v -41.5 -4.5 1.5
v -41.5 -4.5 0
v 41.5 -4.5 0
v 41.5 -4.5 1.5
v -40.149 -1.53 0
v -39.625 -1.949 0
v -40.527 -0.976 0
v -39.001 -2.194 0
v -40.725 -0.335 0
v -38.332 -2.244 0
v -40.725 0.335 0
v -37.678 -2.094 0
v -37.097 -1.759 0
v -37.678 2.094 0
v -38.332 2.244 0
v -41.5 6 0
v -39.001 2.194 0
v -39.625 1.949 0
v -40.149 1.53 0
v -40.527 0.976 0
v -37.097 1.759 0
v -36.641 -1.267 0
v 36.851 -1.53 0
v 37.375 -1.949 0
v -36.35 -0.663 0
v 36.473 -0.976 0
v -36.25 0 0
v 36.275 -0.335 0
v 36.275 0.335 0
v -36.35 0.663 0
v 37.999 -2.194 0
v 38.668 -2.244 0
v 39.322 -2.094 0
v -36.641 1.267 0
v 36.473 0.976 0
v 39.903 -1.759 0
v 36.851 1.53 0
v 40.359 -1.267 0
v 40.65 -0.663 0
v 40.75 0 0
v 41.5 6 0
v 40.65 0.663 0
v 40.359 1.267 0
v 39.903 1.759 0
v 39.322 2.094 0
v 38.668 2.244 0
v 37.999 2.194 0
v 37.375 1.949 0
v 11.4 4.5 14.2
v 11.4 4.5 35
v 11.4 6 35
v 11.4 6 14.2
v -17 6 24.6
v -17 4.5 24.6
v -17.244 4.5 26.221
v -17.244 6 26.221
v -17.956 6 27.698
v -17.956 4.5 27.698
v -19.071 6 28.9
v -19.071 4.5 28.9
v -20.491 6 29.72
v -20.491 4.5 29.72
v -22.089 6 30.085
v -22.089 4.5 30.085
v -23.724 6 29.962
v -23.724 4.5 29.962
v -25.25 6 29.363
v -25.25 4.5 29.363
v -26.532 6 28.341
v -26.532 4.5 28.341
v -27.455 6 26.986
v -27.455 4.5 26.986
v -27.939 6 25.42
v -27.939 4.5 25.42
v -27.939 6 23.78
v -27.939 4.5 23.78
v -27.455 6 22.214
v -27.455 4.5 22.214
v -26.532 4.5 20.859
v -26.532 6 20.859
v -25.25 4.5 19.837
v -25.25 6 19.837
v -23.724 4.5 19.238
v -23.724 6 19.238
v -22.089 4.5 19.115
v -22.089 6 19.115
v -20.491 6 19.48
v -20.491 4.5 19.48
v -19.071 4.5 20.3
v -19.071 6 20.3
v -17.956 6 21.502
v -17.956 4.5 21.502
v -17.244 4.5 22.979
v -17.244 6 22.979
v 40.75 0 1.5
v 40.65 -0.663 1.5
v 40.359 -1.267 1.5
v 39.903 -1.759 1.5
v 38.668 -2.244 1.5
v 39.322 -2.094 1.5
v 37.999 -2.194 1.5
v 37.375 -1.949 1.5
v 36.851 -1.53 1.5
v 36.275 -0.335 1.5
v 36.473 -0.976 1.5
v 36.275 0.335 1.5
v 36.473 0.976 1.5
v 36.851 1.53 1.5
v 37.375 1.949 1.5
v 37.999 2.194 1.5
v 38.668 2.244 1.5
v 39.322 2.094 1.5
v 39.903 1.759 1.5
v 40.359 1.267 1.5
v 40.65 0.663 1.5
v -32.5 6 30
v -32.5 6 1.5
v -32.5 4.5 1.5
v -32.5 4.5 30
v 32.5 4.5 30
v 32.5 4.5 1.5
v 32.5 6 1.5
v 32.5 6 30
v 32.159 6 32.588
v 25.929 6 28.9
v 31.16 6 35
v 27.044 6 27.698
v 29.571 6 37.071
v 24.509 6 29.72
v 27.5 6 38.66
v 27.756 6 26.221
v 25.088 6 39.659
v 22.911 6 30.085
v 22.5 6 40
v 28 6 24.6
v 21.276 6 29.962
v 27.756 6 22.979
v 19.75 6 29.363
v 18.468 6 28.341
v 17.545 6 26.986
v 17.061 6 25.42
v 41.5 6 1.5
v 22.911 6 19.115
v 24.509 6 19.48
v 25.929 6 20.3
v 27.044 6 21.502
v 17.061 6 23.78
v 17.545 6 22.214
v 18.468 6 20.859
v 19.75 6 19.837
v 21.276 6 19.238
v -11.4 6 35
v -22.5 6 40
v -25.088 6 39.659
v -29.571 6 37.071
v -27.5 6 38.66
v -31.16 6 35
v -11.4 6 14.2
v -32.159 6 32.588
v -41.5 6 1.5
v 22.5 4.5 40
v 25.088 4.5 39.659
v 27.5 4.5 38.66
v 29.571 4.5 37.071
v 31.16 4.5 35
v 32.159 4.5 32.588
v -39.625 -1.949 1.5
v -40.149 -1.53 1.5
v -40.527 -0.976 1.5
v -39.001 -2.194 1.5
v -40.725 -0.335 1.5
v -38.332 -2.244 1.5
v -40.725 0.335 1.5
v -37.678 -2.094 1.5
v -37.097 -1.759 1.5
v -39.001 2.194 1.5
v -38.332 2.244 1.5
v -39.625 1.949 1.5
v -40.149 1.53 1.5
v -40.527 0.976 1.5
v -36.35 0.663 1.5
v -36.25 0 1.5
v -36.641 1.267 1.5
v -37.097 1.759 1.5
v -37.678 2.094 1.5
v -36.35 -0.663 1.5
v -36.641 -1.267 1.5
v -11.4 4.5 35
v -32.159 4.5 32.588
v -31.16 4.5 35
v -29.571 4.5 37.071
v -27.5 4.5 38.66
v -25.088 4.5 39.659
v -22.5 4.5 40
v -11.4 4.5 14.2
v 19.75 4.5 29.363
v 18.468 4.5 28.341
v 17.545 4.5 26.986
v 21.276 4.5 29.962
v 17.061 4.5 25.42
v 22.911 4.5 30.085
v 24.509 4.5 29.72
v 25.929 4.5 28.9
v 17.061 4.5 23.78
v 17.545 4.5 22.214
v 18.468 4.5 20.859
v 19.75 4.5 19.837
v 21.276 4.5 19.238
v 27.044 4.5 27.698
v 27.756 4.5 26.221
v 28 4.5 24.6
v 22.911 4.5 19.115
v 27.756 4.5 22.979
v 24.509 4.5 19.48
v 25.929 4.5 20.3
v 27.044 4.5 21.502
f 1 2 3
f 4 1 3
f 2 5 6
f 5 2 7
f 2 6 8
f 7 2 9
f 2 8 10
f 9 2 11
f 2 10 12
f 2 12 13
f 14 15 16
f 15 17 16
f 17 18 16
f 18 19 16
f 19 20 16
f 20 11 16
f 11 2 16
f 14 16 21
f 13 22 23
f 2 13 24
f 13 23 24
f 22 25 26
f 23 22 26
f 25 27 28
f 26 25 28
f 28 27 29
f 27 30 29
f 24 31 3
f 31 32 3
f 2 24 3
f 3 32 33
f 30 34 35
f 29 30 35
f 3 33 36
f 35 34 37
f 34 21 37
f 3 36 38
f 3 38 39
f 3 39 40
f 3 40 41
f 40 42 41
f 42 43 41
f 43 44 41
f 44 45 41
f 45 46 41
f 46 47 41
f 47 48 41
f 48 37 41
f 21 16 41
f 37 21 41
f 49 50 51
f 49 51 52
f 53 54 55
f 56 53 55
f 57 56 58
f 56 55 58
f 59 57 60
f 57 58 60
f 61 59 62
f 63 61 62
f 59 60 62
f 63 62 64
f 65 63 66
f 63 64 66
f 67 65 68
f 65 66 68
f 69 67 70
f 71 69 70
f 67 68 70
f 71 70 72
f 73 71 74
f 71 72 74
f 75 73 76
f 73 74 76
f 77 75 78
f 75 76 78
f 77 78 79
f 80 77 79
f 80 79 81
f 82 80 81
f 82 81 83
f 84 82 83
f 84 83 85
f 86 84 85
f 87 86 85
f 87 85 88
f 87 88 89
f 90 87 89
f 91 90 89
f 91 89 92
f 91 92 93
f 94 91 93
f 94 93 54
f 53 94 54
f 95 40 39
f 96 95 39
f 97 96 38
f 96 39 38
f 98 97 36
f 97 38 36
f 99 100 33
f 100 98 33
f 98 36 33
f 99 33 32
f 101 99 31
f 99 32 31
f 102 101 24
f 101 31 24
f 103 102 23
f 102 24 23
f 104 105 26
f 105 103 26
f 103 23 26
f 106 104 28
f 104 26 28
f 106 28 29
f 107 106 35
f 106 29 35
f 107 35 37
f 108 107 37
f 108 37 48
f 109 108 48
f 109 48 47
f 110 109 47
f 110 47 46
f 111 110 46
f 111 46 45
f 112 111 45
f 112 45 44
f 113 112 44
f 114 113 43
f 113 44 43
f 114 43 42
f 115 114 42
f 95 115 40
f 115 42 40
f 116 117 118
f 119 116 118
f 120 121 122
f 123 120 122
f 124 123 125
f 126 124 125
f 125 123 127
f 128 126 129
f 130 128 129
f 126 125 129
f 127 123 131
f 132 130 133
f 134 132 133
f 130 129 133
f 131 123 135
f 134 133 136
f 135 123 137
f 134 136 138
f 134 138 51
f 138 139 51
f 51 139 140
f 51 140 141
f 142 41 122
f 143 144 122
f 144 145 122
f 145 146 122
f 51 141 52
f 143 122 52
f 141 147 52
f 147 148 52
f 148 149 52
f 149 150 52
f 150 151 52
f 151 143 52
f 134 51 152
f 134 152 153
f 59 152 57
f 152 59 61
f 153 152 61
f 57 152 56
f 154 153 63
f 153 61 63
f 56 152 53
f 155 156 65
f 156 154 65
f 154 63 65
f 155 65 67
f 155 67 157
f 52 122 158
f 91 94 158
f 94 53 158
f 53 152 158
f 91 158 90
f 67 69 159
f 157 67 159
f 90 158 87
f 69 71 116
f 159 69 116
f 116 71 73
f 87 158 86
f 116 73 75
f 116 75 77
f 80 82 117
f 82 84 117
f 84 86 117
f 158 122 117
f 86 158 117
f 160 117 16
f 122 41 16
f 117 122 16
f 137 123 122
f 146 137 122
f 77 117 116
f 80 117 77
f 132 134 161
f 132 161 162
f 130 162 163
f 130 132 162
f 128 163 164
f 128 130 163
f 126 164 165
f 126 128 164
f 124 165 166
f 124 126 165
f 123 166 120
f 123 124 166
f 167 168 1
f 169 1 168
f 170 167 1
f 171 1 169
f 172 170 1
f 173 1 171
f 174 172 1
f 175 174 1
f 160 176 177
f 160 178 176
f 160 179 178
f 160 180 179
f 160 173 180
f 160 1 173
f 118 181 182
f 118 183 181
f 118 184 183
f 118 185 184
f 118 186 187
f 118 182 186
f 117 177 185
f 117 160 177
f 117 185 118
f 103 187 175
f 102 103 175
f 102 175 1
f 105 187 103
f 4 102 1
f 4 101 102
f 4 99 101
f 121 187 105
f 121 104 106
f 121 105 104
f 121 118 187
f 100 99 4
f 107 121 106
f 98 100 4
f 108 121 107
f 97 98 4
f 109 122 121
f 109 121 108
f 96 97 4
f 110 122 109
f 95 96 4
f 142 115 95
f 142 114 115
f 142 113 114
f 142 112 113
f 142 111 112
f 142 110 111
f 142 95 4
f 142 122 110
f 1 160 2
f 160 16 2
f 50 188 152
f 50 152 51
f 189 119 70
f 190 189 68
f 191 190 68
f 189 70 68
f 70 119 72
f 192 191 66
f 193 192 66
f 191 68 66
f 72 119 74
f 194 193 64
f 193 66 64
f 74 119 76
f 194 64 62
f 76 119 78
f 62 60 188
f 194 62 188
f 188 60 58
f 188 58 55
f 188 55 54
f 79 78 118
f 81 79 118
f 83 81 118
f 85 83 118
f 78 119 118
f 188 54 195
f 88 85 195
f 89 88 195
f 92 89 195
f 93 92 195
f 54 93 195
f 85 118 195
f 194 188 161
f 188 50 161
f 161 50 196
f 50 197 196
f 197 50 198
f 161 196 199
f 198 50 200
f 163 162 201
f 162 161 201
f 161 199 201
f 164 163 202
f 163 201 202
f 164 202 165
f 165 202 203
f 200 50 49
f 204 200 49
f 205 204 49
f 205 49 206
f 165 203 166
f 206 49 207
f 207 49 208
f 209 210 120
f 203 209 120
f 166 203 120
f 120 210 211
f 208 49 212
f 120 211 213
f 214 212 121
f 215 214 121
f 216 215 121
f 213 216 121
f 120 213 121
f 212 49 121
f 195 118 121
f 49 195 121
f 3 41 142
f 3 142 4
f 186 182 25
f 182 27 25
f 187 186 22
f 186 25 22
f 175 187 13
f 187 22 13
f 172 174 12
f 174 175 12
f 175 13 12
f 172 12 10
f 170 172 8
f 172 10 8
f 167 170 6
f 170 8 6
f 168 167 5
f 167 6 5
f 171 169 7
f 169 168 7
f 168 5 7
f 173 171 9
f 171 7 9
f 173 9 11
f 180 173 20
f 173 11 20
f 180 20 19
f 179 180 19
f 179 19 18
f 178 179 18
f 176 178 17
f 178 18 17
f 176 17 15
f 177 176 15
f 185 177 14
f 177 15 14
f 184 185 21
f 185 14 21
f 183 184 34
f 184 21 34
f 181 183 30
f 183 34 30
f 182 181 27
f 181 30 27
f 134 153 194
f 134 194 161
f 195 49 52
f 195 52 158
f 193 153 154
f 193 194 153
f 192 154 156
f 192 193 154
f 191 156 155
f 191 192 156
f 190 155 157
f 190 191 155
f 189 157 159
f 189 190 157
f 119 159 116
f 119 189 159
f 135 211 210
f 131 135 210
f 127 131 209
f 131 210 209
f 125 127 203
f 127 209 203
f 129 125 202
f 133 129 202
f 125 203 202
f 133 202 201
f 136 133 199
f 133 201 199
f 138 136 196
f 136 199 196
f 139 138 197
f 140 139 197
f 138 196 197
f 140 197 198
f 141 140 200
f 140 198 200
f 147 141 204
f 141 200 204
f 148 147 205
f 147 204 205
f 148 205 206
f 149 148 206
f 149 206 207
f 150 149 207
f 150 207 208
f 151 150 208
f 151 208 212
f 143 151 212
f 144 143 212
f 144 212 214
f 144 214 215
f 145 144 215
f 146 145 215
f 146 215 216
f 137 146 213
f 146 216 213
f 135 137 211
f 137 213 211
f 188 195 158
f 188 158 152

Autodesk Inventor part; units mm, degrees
ref_plane "YZ Plane" through (0, 0, 0) normal (1, 0, 0) x (0, 1, 0)
ref_plane "XZ Plane" through (0, 0, 0) normal (0, 1, 0) x (-1, 0, 0)
ref_plane "XY Plane" through (0, 0, 0) normal (0, 0, 1) x (1, 0, 0)
sketch "Sketch1" plane through (0, 0, 0) normal (0, 0, 1) x (1, 0, 0)
  line L0 (-35.5, 4.5) -> (35.5, 4.5)
  line L1 (35.5, 4.5) -> (35.5, -4.5)
  line L2 (35.5, -4.5) -> (-35.5, -4.5)
  line L3 (-35.5, -4.5) -> (-35.5, 4.5)
  line L4 (-35.5, 4.5) -> (-41.5, 4.5)
  line L5 (-41.5, 4.5) -> (-41.5, -4.5)
  line L6 (-41.5, -4.5) -> (-35.5, -4.5)
  line L7 (-35.5, -4.5) -> (-35.5, 4.5)
  line L8 (35.5, 4.5) -> (41.5, 4.5)
  line L9 (41.5, 4.5) -> (41.5, -4.5)
  line L10 (41.5, -4.5) -> (35.5, -4.5)
  line L11 (35.5, -4.5) -> (35.5, 4.5)
  line L12 (-41.5, 0) -> (41.5, 0) construction
  circle A0 centre (-38.5, 0) radius 2.25
  circle A1 centre (38.5, 0) radius 2.25
  line L13 (0, 4.5) -> (0, -4.5) construction
  line L14 (-32.5, 4.5) -> (32.5, 4.5)
  line L15 (32.5, 4.5) -> (32.5, 6)
  line L16 (32.5, 6) -> (-32.5, 6)
  line L17 (-32.5, 6) -> (-32.5, 4.5)
  line L18 (-32.5, 6) -> (-41.5, 6)
  line L19 (-41.5, 6) -> (-41.5, 4.5)
  line L20 (-41.5, 4.5) -> (-32.5, 4.5)
  line L21 (-32.5, 4.5) -> (-32.5, 6)
  line L22 (32.5, 6) -> (41.5, 6)
  line L23 (41.5, 6) -> (41.5, 4.5)
  line L24 (41.5, 4.5) -> (32.5, 4.5)
  line L25 (32.5, 4.5) -> (32.5, 6)
  point P0 (0, 0)
  point P1 (0, 0)
  point P2 (0, 7)
  point P3 (0, 0)
  point P4 (0, 6)
  dimension "d0" = 9
  dimension "d1" = 71
  dimension "d2" = 4.5
  dimension "d3" = 4.5
  dimension "d4" = 3
  dimension "d5" = 3
  dimension "d6" = 3
  dimension "d7" = 3
  dimension "d12" = 65
  dimension "d13" = 1.5
extrude "Extrusion1" add sketch "Sketch1" along normal blind 1.5
extrude "Extrusion2" add sketch "Sketch1" along normal blind 40 contours L17 L16 L15 L0
sketch "Sketch2" plane through (-41.5, 4.5, 1.5) normal (0, -1, 0) x (1, 0, 0)
  line L0 (74, 0) -> (74, 38.5) projected
  line L1 (9, 38.5) -> (74, 38.5) projected
  line L2 (9, 0) -> (9, 38.5) projected
  circle A0 centre (19, 23.1) radius 5.5
  circle A1 centre (64, 23.1) radius 5.5
  line L3 (41.5, 38.5) -> (41.5, -1.5) construction
  line L4 (30.1, 33.5) -> (52.9, 33.5)
  line L5 (52.9, 33.5) -> (52.9, 12.7)
  line L6 (52.9, 12.7) -> (30.1, 12.7)
  line L7 (30.1, 12.7) -> (30.1, 33.5)
  line L8 (30.1, 23.1) -> (52.9, 23.1) construction
  point P0 (41.5, 33.5)
  dimension "d16" = 11
  dimension "d17" = 11
  dimension "d19" = 10
  dimension "d21" = 10
  dimension "d22" = 5
  dimension "d23" = 22.8
  dimension "d24" = 20.8
extrude "Extrusion3" cut sketch "Sketch2" against normal blind 10
fillet "Fillet1" radius 10 2 edges at (-32.5, 5.25, 40) (32.5, 5.25, 40)
properties part number "MotorBar"
